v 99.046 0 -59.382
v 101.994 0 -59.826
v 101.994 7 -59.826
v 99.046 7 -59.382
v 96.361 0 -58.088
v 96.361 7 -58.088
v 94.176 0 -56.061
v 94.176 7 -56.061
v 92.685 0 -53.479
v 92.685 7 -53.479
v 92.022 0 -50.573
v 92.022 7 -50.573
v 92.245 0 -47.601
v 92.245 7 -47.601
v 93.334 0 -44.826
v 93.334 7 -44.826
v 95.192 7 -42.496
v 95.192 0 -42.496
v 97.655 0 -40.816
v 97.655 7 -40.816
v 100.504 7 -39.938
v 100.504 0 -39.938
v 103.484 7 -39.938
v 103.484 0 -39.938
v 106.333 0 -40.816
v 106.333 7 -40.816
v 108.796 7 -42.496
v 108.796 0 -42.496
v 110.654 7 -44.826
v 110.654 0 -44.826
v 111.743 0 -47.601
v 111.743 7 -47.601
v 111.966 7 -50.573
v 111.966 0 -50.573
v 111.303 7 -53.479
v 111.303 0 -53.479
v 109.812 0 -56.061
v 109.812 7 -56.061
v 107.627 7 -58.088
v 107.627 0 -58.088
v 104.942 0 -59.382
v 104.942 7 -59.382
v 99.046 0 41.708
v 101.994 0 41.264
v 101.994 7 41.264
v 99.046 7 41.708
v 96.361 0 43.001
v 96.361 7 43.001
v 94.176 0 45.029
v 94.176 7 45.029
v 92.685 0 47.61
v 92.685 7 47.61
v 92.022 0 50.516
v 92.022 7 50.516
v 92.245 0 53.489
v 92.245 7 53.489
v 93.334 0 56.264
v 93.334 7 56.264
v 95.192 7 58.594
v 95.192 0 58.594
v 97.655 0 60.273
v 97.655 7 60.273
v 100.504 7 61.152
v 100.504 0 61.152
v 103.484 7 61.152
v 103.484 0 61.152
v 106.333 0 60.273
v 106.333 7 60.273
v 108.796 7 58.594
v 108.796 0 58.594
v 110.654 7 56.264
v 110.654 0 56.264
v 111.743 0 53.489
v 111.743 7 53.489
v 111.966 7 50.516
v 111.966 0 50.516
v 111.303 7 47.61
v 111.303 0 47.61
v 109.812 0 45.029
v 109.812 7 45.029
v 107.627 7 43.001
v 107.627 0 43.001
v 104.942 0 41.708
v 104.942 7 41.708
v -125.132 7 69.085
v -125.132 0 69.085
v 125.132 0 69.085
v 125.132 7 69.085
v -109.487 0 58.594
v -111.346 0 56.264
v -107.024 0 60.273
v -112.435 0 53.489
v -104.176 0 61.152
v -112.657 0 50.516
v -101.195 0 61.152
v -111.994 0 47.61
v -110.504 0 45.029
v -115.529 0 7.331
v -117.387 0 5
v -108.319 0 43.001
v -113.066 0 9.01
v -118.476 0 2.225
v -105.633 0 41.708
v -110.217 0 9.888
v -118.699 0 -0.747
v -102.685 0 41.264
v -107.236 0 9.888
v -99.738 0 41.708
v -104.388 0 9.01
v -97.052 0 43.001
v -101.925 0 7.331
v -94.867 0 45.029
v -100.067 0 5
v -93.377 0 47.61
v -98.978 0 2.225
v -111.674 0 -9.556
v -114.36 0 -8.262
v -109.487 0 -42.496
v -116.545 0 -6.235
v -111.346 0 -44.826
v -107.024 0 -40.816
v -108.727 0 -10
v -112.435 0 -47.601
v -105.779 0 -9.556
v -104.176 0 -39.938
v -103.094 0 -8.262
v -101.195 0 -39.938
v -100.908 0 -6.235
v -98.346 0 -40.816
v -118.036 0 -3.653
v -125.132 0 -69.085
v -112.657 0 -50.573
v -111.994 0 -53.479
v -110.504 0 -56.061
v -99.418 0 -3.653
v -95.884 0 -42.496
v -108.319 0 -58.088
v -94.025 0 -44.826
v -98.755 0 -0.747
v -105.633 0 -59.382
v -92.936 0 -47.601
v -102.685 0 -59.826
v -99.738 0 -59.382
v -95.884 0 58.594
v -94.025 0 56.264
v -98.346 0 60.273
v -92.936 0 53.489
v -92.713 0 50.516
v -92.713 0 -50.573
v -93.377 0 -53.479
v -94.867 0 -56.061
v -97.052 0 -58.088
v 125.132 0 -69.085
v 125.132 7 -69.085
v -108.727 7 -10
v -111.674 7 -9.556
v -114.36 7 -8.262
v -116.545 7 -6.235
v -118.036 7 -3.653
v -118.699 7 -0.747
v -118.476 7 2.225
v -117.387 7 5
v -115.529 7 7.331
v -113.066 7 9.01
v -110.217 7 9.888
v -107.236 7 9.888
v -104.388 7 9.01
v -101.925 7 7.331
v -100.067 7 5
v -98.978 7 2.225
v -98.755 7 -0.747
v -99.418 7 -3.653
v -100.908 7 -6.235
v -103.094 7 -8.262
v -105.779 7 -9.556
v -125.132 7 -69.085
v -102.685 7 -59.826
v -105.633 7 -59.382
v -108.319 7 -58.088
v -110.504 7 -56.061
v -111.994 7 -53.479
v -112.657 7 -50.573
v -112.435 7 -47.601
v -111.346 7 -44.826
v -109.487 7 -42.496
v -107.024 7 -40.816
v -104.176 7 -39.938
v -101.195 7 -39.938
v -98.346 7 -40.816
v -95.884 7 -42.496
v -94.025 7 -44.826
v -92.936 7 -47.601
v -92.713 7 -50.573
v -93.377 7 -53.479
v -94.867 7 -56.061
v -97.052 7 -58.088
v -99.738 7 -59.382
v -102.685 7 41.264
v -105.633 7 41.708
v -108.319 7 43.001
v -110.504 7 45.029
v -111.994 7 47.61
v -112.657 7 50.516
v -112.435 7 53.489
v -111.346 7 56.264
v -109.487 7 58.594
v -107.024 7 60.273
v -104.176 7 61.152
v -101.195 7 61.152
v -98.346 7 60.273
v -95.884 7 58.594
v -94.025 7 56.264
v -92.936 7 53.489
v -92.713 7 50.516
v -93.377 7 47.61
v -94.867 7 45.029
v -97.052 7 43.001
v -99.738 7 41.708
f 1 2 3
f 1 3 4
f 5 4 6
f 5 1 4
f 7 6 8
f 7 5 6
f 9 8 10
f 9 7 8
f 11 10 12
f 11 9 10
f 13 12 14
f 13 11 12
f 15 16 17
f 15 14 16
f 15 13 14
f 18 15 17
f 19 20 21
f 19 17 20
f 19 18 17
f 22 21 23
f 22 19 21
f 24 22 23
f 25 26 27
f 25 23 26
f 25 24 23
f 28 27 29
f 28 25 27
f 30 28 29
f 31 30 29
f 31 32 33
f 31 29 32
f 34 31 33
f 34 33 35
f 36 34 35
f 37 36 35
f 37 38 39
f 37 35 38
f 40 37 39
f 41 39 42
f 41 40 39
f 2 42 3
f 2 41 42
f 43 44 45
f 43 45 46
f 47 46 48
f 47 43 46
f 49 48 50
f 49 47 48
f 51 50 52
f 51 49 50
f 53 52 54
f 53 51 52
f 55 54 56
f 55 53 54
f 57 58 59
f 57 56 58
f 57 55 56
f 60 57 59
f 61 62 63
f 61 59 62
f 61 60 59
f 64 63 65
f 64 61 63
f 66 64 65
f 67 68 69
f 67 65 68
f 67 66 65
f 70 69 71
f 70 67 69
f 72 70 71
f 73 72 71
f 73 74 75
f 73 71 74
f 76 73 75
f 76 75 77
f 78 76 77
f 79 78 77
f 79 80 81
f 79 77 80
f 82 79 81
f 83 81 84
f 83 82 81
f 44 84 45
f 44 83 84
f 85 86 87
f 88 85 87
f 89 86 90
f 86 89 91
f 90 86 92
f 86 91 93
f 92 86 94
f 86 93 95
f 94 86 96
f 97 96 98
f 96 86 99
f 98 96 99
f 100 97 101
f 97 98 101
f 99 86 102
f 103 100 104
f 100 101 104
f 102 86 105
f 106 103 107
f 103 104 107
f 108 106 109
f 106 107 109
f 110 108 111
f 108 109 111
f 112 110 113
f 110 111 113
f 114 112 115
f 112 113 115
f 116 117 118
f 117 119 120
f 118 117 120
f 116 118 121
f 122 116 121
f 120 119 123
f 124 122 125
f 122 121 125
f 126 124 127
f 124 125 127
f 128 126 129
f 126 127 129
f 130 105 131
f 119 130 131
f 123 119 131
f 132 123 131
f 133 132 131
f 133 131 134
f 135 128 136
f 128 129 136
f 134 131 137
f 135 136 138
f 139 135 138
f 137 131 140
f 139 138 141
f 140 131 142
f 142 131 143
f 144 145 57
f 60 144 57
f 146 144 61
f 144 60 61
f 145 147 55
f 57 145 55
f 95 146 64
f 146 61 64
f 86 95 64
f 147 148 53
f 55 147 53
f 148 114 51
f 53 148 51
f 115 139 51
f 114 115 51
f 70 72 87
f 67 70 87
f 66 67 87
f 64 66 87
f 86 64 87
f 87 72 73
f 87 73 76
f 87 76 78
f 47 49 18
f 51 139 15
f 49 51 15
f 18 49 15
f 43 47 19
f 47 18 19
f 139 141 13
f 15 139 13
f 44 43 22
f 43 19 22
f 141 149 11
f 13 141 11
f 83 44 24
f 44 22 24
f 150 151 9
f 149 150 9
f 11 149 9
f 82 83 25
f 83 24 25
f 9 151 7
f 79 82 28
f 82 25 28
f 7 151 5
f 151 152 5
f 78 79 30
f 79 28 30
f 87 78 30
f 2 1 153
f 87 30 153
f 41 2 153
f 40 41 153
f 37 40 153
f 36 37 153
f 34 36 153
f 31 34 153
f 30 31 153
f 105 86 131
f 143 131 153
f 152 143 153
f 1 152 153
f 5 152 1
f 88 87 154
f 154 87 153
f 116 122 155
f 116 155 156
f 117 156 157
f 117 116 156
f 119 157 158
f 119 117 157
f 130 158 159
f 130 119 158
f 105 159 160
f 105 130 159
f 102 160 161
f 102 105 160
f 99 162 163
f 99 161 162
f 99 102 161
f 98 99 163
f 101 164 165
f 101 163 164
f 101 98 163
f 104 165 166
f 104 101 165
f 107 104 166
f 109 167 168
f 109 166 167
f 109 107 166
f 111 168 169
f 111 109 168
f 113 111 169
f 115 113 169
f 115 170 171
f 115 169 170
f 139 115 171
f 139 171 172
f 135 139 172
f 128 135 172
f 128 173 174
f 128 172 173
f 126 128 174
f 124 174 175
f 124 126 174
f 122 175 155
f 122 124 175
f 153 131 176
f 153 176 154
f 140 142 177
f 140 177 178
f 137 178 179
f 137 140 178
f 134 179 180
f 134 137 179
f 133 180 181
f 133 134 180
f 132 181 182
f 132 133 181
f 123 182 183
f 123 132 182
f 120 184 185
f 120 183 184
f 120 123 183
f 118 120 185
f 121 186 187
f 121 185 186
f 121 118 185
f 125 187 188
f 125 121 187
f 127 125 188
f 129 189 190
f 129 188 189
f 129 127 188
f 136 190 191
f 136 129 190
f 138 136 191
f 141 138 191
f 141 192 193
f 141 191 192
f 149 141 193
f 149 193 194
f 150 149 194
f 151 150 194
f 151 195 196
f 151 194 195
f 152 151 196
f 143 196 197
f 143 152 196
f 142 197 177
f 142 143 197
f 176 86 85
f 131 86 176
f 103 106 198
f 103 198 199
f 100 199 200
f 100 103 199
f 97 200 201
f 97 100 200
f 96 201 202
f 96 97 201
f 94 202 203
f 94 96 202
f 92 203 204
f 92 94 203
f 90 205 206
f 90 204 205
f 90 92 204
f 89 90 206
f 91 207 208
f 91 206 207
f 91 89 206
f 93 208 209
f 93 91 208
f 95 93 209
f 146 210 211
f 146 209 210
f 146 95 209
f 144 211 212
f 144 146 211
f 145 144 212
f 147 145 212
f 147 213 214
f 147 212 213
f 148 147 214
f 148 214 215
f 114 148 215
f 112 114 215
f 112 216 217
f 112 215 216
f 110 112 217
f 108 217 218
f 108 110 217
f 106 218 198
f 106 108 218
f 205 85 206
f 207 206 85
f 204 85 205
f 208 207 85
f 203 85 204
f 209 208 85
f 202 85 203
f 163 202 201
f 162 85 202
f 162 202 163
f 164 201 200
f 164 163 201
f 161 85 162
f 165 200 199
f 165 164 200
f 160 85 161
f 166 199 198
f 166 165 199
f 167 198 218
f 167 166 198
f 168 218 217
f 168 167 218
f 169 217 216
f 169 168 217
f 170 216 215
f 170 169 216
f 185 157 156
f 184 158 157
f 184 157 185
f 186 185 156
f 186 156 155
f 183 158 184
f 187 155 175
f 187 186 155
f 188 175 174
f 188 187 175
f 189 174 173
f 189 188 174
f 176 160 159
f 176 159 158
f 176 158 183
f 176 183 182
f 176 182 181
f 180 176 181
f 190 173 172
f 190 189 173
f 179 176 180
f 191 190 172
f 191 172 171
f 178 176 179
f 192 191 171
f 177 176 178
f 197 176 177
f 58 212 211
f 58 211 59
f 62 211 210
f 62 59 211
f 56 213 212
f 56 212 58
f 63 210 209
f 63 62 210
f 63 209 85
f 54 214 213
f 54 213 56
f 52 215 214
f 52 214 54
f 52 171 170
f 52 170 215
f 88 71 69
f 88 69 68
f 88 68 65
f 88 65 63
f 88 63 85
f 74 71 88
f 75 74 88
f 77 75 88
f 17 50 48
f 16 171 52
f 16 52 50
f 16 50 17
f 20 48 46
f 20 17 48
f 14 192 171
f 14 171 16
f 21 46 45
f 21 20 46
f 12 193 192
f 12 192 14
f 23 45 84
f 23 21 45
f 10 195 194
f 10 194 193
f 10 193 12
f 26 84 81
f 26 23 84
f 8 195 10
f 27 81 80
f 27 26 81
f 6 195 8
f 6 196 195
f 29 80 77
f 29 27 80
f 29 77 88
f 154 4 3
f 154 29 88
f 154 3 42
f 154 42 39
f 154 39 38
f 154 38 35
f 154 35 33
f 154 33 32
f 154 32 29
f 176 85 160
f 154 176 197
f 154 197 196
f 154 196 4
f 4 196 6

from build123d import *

# Parameters (mm, degrees)
SKETCH4_W               = 250.263322682
SKETCH4_H               = 138.169331444
BOSS_EXTRUDE1_DEPTH     = 7
CUT_EXTRUDE1_DEPTH      = 60
CUT_EXTRUDE1_DEPTH_BACK = 144.107035844
SKETCH5_R               = 10
CUT_EXTRUDE6_DEPTH      = 68
CUT_EXTRUDE6_DEPTH_BACK = 76
SKETCH9_R               = 10


with BuildPart() as part:
    # Sketch4 → Boss-Extrude1 (new body)
    with BuildSketch(Plane(origin=(0, 0, 0), x_dir=(1, 0, 0), z_dir=(0, 1, 0))):
        Rectangle(SKETCH4_W, SKETCH4_H)
    extrude(amount=BOSS_EXTRUDE1_DEPTH)

    # Sketch5 → Cut-Extrude1 (cut, two sides: drawn at the far end of the back side and taken through both)
    with BuildSketch(Plane(origin=(0, 0, 0), x_dir=(1, 0, 0), z_dir=(0, 1, 0)).offset(-CUT_EXTRUDE1_DEPTH_BACK)):
        with Locations(Location((-102.685331177, 49.826038164, 0), (0, 0, 90))):
            Circle(SKETCH5_R)
        with Locations(Location((101.994027262, 49.826038164, 0), (0, 0, 90))):
            Circle(SKETCH5_R)
        with Locations(Location((101.994027262, -51.263637619, 0), (0, 0, 90))):
            Circle(SKETCH5_R)
        with Locations(Location((-102.685331177, -51.263637619, 0), (0, 0, 90))):
            Circle(SKETCH5_R)
    extrude(amount=CUT_EXTRUDE1_DEPTH + CUT_EXTRUDE1_DEPTH_BACK, mode=Mode.SUBTRACT)

    # Sketch9 → Cut-Extrude6 (cut, two sides: drawn at the far end of the back side and taken through both)
    with BuildSketch(Plane(origin=(0, 0, 0), x_dir=(1, 0, 0), z_dir=(0, 1, 0)).offset(-CUT_EXTRUDE6_DEPTH_BACK)):
        with Locations(Location((-108.72678805, 0, 0), (0, 0, 90))):
            Circle(SKETCH9_R)
    extrude(amount=CUT_EXTRUDE6_DEPTH + CUT_EXTRUDE6_DEPTH_BACK, mode=Mode.SUBTRACT)


solid = part.part
